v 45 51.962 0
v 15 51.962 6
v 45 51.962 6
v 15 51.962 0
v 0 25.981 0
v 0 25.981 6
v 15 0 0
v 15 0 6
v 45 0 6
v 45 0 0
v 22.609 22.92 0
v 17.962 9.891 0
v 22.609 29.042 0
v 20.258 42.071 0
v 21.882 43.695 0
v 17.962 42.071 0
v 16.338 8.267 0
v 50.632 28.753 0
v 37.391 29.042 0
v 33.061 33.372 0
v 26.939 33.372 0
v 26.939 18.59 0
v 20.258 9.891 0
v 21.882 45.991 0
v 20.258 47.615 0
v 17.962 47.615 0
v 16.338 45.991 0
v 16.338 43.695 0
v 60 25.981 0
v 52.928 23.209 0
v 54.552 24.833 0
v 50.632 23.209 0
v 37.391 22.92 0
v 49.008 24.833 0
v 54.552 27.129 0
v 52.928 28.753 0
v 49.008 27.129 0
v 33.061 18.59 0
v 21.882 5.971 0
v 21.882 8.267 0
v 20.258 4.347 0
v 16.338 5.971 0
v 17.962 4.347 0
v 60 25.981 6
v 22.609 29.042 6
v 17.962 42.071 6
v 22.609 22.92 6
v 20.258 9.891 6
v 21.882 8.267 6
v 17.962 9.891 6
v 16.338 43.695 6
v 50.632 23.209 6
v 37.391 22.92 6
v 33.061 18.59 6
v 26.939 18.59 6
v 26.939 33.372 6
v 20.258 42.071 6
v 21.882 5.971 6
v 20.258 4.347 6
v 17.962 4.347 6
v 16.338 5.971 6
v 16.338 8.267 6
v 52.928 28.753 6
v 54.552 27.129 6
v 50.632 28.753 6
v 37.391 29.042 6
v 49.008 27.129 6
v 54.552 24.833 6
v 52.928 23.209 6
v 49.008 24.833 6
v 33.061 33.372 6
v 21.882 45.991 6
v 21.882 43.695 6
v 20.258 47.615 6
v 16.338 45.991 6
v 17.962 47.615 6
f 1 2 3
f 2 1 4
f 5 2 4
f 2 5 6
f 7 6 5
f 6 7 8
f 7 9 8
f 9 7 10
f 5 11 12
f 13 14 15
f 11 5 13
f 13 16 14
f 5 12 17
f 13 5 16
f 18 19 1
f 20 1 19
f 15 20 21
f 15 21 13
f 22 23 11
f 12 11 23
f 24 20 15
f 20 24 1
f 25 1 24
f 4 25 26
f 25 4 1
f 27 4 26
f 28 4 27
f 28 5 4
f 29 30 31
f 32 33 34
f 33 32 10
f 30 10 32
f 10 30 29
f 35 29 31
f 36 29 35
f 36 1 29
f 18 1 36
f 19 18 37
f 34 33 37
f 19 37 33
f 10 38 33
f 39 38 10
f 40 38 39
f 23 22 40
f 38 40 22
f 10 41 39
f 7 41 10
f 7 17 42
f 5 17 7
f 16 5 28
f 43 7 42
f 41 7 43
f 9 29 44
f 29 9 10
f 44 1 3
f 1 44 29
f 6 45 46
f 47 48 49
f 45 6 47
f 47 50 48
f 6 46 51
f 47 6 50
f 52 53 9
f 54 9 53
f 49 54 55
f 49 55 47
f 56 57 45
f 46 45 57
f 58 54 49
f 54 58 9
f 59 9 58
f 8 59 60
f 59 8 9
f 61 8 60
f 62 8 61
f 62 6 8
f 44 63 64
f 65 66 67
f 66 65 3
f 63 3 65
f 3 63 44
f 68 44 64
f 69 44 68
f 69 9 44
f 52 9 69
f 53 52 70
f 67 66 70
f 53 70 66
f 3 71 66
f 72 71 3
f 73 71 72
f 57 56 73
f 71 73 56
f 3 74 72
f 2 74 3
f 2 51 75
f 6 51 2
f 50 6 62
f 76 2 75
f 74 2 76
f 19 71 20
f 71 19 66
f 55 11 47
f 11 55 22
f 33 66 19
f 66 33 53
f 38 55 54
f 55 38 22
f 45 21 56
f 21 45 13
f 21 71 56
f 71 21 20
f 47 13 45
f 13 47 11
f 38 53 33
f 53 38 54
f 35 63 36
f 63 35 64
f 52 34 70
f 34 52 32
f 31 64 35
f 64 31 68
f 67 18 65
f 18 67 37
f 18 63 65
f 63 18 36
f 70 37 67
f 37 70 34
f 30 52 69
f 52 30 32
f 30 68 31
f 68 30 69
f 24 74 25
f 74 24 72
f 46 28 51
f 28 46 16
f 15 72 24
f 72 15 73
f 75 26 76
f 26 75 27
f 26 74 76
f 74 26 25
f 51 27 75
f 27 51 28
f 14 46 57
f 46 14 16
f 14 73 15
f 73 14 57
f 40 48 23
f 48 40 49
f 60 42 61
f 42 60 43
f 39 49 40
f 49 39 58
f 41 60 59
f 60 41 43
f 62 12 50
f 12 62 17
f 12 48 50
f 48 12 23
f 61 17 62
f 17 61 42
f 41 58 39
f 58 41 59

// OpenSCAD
$fn = 32;

// ----------------------------------------------------------------------
// Polygon plate: 6-gon R30, 3 bolt windows
// ----------------------------------------------------------------------

// --- parameters (mm) ---
sides = 6;                // number of polygon sides
plate_r = 30;             // circumscribed radius of the polygon
bore_r = 8;               // centre bore radius
bolts = 3;                // number of bolt windows
ring_r = 21.78;           // bolt-circle radius
bolt_r = 3;               // bolt window radius
plate_t = 6;              // plate thickness, Z (extrusion height)

plate_d = 2 * plate_r;  // circumscribed diameter
bore_d = 2 * bore_r;  // centre bore diameter
bolt_d = 2 * bolt_r;  // bolt window diameter
ring_d = 2 * ring_r;  // bolt-circle diameter

profile = [[60, 25.981], [45, 51.962], [15, 51.962], [0, 25.981], [15, 0], [45, 0]];  // primary outline, 6 points, counter clockwise
void_1 = [[37.391, 29.042], [33.061, 33.372], [26.939, 33.372], [22.609, 29.042], [22.609, 22.92], [26.939, 18.59], [33.061, 18.59], [37.391, 22.92]];  // centre bore, 8 points
void_2 = [[54.552, 27.129], [52.928, 28.753], [50.632, 28.753], [49.008, 27.129], [49.008, 24.833], [50.632, 23.209], [52.928, 23.209], [54.552, 24.833]];  // bolt window 1, 8 points
void_3 = [[21.882, 45.991], [20.258, 47.615], [17.962, 47.615], [16.338, 45.991], [16.338, 43.695], [17.962, 42.071], [20.258, 42.071], [21.882, 43.695]];  // bolt window 2, 8 points
void_4 = [[21.882, 8.267], [20.258, 9.891], [17.962, 9.891], [16.338, 8.267], [16.338, 5.971], [17.962, 4.347], [20.258, 4.347], [21.882, 5.971]];  // bolt window 3, 8 points

// --- the one profile operation ---
difference() {
  linear_extrude(height = plate_t) polygon(points = profile);
  translate([0, 0, -1])
    linear_extrude(height = plate_t + 2) polygon(points = void_1);
  translate([0, 0, -1])
    linear_extrude(height = plate_t + 2) polygon(points = void_2);
  translate([0, 0, -1])
    linear_extrude(height = plate_t + 2) polygon(points = void_3);
  translate([0, 0, -1])
    linear_extrude(height = plate_t + 2) polygon(points = void_4);
}
